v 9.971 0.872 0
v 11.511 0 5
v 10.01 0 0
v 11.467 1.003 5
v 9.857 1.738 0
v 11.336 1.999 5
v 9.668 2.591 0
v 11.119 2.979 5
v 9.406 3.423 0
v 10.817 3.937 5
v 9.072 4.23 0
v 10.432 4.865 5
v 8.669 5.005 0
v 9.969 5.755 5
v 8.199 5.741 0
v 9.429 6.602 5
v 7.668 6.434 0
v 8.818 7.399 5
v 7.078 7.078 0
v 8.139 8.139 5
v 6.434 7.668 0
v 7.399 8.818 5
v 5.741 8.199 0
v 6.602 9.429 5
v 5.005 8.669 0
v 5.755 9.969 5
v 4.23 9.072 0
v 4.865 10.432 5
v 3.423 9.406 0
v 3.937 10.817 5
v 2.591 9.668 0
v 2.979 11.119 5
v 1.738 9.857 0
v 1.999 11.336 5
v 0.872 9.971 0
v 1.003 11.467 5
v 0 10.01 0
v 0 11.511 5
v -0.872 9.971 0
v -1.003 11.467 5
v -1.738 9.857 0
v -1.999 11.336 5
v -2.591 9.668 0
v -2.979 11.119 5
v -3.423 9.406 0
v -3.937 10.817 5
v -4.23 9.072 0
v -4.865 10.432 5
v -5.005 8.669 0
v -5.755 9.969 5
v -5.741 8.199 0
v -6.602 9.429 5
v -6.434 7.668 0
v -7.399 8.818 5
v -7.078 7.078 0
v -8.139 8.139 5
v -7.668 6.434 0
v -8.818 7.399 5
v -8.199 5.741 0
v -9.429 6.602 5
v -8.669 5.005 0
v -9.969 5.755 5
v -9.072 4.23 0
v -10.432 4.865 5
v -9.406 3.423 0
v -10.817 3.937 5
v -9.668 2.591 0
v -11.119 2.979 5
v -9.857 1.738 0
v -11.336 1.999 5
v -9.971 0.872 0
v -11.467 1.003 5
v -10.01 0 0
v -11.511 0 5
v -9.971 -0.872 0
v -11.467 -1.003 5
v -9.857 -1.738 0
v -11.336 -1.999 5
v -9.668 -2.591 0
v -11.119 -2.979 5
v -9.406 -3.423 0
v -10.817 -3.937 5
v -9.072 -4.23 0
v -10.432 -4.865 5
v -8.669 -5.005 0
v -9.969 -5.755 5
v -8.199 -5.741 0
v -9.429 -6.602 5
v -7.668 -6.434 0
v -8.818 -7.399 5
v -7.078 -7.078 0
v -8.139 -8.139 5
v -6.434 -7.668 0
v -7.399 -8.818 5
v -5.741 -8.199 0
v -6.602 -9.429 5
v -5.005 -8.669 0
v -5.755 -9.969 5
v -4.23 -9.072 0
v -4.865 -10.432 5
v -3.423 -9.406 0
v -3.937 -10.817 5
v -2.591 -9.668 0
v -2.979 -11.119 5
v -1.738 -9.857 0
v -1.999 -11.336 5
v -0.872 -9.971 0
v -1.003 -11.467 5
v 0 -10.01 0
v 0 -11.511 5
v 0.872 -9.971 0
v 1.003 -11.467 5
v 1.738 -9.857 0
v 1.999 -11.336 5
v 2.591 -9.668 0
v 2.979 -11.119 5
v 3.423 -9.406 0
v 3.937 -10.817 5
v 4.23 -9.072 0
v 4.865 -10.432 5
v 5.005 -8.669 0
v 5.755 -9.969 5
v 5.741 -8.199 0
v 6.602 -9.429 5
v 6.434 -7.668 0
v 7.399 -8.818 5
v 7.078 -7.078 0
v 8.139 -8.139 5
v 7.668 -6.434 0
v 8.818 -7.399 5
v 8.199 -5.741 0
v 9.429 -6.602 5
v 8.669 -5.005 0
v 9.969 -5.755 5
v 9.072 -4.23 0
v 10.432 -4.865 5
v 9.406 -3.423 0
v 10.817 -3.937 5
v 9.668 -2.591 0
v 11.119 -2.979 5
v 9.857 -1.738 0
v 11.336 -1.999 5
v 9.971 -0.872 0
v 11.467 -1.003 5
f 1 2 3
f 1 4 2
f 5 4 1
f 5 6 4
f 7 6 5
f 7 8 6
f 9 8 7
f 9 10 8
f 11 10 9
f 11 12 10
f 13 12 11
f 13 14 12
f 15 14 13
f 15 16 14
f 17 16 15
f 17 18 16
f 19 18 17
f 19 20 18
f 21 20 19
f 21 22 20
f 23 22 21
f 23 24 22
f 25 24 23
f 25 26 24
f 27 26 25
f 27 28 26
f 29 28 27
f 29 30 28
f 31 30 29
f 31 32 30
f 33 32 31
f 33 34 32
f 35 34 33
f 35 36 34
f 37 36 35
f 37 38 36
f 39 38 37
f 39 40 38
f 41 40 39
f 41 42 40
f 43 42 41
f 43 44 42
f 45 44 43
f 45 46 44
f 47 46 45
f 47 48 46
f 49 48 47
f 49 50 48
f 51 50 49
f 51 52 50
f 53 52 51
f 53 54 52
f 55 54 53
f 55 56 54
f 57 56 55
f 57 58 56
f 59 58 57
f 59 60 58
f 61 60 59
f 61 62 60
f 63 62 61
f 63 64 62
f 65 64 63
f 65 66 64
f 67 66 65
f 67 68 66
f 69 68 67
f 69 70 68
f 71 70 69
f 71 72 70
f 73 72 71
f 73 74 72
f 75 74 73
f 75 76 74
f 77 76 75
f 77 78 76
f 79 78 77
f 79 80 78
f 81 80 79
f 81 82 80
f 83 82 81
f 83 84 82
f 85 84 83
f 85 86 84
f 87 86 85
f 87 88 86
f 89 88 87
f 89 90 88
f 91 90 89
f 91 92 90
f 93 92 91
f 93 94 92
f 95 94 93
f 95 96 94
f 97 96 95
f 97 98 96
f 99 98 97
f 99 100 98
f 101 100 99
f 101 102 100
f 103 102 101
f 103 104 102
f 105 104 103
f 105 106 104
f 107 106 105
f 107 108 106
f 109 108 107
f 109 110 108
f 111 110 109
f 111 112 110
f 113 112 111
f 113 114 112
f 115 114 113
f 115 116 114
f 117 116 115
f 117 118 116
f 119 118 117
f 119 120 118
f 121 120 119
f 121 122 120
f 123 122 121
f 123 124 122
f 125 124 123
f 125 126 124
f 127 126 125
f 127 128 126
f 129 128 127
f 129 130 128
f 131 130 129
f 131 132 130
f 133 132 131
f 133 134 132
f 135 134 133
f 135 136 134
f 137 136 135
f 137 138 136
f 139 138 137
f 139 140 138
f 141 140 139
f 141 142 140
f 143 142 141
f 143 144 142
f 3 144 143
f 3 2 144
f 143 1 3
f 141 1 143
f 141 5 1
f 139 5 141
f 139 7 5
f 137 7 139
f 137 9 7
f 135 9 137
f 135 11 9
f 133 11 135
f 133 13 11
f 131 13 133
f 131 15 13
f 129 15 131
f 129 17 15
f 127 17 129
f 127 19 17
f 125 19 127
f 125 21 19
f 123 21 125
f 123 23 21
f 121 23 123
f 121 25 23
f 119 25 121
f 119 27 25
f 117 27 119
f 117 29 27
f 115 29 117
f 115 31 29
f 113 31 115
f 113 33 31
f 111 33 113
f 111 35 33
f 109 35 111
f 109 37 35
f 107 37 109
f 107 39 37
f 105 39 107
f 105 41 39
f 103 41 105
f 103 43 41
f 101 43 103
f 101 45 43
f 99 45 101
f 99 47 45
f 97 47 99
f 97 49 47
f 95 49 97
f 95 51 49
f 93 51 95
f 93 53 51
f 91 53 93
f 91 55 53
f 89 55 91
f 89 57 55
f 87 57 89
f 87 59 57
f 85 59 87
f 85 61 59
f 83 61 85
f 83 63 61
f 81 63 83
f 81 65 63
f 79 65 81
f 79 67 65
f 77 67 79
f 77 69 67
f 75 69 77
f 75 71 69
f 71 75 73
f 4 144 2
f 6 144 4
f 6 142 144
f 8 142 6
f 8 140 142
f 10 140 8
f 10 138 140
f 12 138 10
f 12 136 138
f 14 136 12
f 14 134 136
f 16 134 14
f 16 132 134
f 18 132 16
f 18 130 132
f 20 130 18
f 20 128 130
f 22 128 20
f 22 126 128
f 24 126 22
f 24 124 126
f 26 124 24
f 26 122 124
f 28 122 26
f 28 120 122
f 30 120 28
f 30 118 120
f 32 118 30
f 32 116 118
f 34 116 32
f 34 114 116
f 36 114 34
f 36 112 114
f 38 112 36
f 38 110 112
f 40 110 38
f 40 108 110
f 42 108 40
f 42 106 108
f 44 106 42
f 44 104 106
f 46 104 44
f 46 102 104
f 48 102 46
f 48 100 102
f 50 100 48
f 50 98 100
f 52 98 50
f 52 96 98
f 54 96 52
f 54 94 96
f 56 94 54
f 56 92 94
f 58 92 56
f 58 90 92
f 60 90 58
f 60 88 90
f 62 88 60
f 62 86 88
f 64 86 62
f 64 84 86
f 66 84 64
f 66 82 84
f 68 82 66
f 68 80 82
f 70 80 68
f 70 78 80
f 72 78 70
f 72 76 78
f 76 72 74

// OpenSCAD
use <MCAD/regular_shapes.scad>

min_od=20;
max_od=23;
hat_height=5;
inner_height=10;
min_thickness=2.4;

module cone_outer(height,radius1,radius2,fn=72){
   fudge = 1/cos(180/fn);
   cylinder(h=height,r1=radius1*fudge,r2=radius2*fudge,$fn=fn);
}

module PoolFencePlug(id) {
    echo("id", id);
    min_or=min_od  / 2;
    max_or=max_od / 2;
    cone_outer(hat_height, min_or, max_or);
    ir = id / 2;
    translate([0, 0, hat_height]) difference() {
        linear_extrude(inner_height) hexagon(false, id, false);
        linear_extrude(inner_height) hexagon(false, id - min_thickness, false);
    }
}


PoolFencePlug(20);
